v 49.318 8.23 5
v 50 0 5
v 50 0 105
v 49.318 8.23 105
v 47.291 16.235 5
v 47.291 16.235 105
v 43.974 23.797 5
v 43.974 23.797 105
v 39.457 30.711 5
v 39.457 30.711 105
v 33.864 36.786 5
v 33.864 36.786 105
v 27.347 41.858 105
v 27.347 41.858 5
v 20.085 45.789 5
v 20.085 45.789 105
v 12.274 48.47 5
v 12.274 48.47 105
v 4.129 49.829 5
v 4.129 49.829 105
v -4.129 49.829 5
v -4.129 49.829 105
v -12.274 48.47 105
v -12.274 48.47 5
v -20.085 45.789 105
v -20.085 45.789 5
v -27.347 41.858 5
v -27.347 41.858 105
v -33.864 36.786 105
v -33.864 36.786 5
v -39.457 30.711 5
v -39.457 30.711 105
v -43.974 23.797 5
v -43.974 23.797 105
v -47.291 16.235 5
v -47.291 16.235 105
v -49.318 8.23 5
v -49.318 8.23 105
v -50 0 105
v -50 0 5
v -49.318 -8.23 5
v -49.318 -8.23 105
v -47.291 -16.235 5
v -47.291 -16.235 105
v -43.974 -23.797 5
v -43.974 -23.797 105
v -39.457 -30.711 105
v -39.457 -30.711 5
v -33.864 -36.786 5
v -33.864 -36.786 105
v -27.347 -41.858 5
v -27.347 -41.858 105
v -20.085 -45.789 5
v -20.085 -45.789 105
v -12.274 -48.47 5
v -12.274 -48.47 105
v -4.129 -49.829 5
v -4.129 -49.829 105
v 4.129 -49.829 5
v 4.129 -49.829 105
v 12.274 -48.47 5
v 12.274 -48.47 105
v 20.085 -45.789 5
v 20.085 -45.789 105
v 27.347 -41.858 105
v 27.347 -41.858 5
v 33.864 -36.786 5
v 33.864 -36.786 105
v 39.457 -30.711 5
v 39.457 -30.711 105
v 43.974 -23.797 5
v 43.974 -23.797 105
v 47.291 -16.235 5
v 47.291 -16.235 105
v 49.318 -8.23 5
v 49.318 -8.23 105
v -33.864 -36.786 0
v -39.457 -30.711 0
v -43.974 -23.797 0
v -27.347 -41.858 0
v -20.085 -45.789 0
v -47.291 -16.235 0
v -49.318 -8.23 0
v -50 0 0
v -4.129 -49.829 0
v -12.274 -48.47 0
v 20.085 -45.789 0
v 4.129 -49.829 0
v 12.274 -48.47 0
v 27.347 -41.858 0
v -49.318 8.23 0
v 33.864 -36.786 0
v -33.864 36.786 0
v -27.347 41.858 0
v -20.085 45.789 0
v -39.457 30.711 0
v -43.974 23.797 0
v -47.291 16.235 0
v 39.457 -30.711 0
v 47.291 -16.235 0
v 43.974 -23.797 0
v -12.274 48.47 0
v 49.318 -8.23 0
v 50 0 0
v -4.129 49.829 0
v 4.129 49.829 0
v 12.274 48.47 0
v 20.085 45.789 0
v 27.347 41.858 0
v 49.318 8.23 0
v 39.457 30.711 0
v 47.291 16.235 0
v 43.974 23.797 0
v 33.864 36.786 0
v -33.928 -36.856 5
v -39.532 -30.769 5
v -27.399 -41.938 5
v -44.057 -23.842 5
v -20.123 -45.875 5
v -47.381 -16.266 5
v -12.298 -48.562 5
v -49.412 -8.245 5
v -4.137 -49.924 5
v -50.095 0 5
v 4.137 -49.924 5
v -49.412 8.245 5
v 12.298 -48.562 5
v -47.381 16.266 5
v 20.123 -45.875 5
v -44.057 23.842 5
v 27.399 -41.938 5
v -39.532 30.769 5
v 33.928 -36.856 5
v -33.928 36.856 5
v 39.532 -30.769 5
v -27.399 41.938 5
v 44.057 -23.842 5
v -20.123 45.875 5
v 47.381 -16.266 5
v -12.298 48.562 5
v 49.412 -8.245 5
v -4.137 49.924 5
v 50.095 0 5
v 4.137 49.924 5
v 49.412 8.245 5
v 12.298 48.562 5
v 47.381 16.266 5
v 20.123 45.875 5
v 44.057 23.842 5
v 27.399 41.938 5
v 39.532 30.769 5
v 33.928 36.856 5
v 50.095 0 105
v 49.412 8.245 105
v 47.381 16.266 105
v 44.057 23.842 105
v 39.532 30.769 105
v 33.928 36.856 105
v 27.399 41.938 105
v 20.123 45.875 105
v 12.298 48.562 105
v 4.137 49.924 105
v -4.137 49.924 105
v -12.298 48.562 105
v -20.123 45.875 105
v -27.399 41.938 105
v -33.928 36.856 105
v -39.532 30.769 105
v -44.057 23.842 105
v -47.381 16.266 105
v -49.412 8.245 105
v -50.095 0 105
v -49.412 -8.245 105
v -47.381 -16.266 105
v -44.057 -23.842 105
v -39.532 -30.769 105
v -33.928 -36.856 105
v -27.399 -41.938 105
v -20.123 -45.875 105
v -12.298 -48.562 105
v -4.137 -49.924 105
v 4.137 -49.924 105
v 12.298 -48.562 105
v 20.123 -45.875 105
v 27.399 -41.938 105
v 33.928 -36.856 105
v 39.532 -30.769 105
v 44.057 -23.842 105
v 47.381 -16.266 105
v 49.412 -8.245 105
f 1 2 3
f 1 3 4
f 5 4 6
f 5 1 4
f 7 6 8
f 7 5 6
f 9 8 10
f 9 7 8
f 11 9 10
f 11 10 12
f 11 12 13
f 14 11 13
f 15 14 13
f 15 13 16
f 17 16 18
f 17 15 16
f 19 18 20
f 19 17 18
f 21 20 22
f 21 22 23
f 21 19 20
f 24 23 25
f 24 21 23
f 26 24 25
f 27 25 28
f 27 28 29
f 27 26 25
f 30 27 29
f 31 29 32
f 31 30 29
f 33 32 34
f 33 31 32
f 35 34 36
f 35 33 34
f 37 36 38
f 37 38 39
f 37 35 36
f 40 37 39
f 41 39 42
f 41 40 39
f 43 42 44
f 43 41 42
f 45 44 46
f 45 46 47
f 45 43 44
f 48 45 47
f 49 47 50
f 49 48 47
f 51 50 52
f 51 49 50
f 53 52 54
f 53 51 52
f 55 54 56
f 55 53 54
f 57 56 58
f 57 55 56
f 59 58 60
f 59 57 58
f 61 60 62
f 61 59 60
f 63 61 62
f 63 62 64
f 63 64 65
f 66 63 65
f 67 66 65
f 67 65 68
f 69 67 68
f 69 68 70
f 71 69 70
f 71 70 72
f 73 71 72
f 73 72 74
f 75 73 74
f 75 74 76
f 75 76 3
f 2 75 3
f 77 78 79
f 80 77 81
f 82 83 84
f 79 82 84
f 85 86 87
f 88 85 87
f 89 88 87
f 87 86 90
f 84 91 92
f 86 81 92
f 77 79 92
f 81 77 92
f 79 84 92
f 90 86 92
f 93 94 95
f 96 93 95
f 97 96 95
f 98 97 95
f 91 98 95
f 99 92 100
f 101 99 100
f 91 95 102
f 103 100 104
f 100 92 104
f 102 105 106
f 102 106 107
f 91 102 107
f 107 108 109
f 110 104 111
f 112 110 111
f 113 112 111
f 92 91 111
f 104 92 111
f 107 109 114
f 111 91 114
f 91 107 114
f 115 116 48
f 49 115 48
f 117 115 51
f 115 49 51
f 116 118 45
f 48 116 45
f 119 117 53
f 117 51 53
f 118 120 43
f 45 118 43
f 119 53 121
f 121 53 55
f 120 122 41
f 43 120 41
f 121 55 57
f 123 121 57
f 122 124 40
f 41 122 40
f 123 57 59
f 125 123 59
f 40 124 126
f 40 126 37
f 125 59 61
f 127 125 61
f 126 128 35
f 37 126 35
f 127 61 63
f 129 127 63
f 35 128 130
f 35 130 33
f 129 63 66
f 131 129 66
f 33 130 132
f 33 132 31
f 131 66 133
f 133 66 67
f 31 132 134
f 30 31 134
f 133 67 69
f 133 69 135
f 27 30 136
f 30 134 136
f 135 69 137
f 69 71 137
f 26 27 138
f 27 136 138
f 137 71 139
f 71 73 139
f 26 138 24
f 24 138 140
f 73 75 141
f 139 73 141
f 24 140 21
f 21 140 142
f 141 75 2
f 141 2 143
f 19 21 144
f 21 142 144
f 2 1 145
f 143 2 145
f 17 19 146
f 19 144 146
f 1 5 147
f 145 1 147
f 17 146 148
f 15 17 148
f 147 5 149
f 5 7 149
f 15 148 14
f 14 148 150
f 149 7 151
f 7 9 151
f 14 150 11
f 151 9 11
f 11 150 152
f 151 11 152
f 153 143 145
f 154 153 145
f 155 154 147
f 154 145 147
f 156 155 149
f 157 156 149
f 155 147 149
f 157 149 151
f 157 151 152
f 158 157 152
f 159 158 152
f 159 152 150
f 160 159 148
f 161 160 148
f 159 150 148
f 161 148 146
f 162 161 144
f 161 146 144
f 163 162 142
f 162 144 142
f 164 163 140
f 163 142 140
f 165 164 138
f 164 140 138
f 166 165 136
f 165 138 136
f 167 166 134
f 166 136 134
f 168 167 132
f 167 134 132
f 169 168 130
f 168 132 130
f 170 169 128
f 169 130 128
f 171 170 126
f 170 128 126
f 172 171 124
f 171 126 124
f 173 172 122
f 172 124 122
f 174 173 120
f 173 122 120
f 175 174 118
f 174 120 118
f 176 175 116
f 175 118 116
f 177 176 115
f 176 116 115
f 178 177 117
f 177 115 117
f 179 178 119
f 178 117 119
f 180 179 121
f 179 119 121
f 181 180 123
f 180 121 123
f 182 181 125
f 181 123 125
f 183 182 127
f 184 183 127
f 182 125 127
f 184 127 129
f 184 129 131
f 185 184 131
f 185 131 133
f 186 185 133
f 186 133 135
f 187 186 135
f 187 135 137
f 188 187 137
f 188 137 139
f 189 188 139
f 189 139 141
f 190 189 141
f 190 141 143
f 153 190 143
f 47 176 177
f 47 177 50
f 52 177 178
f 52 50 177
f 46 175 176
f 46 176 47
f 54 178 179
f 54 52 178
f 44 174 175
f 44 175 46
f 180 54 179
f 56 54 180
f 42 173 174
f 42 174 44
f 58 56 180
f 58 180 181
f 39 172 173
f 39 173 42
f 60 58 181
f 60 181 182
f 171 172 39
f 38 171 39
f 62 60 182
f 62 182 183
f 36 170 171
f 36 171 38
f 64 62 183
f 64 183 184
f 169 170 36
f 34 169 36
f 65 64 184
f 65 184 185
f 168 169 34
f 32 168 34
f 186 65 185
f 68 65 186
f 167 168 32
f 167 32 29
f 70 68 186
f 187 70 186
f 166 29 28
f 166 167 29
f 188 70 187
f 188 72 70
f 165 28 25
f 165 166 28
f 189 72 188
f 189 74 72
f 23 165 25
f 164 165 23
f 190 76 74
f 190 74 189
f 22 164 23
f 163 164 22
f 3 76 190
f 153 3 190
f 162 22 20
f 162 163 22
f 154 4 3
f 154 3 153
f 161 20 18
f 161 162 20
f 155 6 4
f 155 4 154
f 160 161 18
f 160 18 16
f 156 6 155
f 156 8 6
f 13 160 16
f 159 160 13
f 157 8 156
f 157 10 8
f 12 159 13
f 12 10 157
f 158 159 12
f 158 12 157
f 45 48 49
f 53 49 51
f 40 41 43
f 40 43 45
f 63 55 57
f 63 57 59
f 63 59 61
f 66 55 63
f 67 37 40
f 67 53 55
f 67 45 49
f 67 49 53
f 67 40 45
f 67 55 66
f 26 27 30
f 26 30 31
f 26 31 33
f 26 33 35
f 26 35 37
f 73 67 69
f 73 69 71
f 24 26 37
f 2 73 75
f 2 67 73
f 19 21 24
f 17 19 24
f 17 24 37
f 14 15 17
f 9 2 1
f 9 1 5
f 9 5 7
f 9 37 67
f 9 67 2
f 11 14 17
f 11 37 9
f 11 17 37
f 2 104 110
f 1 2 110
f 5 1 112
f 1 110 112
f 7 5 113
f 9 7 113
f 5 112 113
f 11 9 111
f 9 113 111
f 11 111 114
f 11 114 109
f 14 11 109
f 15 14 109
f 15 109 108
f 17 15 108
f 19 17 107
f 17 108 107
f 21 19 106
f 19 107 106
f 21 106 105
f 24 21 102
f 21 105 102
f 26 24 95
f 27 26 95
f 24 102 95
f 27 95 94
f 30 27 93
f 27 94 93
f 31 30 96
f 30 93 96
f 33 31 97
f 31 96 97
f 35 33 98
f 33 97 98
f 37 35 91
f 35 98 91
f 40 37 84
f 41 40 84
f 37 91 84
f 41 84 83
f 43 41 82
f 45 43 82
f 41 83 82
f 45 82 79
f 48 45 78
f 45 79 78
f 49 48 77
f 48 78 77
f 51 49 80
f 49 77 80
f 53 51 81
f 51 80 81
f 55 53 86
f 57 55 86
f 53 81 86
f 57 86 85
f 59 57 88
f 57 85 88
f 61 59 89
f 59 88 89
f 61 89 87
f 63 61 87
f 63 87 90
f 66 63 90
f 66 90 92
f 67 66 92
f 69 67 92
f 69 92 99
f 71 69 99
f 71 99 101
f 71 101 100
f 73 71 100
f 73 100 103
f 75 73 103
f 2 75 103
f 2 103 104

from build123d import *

# Parameters (mm, degrees)
F0_R     = 50
F1_DEPTH = 5
F2_R     = 50.094816
F2_R_2   = 50
F3_DEPTH = 100


with BuildPart() as f1:
    # F0 (on Top) → F1 (new body)
    with BuildSketch(Plane.XY):
        Circle(F0_R)
    extrude(amount=F1_DEPTH)


with BuildPart() as f3:
    # F2 (on face) → F3 (new body)
    with BuildSketch(Plane.XY.offset(5)):
        Circle(F2_R)
        Circle(F2_R_2, mode=Mode.SUBTRACT)
    extrude(amount=F3_DEPTH)


solid = Compound([f1.part, f3.part])
